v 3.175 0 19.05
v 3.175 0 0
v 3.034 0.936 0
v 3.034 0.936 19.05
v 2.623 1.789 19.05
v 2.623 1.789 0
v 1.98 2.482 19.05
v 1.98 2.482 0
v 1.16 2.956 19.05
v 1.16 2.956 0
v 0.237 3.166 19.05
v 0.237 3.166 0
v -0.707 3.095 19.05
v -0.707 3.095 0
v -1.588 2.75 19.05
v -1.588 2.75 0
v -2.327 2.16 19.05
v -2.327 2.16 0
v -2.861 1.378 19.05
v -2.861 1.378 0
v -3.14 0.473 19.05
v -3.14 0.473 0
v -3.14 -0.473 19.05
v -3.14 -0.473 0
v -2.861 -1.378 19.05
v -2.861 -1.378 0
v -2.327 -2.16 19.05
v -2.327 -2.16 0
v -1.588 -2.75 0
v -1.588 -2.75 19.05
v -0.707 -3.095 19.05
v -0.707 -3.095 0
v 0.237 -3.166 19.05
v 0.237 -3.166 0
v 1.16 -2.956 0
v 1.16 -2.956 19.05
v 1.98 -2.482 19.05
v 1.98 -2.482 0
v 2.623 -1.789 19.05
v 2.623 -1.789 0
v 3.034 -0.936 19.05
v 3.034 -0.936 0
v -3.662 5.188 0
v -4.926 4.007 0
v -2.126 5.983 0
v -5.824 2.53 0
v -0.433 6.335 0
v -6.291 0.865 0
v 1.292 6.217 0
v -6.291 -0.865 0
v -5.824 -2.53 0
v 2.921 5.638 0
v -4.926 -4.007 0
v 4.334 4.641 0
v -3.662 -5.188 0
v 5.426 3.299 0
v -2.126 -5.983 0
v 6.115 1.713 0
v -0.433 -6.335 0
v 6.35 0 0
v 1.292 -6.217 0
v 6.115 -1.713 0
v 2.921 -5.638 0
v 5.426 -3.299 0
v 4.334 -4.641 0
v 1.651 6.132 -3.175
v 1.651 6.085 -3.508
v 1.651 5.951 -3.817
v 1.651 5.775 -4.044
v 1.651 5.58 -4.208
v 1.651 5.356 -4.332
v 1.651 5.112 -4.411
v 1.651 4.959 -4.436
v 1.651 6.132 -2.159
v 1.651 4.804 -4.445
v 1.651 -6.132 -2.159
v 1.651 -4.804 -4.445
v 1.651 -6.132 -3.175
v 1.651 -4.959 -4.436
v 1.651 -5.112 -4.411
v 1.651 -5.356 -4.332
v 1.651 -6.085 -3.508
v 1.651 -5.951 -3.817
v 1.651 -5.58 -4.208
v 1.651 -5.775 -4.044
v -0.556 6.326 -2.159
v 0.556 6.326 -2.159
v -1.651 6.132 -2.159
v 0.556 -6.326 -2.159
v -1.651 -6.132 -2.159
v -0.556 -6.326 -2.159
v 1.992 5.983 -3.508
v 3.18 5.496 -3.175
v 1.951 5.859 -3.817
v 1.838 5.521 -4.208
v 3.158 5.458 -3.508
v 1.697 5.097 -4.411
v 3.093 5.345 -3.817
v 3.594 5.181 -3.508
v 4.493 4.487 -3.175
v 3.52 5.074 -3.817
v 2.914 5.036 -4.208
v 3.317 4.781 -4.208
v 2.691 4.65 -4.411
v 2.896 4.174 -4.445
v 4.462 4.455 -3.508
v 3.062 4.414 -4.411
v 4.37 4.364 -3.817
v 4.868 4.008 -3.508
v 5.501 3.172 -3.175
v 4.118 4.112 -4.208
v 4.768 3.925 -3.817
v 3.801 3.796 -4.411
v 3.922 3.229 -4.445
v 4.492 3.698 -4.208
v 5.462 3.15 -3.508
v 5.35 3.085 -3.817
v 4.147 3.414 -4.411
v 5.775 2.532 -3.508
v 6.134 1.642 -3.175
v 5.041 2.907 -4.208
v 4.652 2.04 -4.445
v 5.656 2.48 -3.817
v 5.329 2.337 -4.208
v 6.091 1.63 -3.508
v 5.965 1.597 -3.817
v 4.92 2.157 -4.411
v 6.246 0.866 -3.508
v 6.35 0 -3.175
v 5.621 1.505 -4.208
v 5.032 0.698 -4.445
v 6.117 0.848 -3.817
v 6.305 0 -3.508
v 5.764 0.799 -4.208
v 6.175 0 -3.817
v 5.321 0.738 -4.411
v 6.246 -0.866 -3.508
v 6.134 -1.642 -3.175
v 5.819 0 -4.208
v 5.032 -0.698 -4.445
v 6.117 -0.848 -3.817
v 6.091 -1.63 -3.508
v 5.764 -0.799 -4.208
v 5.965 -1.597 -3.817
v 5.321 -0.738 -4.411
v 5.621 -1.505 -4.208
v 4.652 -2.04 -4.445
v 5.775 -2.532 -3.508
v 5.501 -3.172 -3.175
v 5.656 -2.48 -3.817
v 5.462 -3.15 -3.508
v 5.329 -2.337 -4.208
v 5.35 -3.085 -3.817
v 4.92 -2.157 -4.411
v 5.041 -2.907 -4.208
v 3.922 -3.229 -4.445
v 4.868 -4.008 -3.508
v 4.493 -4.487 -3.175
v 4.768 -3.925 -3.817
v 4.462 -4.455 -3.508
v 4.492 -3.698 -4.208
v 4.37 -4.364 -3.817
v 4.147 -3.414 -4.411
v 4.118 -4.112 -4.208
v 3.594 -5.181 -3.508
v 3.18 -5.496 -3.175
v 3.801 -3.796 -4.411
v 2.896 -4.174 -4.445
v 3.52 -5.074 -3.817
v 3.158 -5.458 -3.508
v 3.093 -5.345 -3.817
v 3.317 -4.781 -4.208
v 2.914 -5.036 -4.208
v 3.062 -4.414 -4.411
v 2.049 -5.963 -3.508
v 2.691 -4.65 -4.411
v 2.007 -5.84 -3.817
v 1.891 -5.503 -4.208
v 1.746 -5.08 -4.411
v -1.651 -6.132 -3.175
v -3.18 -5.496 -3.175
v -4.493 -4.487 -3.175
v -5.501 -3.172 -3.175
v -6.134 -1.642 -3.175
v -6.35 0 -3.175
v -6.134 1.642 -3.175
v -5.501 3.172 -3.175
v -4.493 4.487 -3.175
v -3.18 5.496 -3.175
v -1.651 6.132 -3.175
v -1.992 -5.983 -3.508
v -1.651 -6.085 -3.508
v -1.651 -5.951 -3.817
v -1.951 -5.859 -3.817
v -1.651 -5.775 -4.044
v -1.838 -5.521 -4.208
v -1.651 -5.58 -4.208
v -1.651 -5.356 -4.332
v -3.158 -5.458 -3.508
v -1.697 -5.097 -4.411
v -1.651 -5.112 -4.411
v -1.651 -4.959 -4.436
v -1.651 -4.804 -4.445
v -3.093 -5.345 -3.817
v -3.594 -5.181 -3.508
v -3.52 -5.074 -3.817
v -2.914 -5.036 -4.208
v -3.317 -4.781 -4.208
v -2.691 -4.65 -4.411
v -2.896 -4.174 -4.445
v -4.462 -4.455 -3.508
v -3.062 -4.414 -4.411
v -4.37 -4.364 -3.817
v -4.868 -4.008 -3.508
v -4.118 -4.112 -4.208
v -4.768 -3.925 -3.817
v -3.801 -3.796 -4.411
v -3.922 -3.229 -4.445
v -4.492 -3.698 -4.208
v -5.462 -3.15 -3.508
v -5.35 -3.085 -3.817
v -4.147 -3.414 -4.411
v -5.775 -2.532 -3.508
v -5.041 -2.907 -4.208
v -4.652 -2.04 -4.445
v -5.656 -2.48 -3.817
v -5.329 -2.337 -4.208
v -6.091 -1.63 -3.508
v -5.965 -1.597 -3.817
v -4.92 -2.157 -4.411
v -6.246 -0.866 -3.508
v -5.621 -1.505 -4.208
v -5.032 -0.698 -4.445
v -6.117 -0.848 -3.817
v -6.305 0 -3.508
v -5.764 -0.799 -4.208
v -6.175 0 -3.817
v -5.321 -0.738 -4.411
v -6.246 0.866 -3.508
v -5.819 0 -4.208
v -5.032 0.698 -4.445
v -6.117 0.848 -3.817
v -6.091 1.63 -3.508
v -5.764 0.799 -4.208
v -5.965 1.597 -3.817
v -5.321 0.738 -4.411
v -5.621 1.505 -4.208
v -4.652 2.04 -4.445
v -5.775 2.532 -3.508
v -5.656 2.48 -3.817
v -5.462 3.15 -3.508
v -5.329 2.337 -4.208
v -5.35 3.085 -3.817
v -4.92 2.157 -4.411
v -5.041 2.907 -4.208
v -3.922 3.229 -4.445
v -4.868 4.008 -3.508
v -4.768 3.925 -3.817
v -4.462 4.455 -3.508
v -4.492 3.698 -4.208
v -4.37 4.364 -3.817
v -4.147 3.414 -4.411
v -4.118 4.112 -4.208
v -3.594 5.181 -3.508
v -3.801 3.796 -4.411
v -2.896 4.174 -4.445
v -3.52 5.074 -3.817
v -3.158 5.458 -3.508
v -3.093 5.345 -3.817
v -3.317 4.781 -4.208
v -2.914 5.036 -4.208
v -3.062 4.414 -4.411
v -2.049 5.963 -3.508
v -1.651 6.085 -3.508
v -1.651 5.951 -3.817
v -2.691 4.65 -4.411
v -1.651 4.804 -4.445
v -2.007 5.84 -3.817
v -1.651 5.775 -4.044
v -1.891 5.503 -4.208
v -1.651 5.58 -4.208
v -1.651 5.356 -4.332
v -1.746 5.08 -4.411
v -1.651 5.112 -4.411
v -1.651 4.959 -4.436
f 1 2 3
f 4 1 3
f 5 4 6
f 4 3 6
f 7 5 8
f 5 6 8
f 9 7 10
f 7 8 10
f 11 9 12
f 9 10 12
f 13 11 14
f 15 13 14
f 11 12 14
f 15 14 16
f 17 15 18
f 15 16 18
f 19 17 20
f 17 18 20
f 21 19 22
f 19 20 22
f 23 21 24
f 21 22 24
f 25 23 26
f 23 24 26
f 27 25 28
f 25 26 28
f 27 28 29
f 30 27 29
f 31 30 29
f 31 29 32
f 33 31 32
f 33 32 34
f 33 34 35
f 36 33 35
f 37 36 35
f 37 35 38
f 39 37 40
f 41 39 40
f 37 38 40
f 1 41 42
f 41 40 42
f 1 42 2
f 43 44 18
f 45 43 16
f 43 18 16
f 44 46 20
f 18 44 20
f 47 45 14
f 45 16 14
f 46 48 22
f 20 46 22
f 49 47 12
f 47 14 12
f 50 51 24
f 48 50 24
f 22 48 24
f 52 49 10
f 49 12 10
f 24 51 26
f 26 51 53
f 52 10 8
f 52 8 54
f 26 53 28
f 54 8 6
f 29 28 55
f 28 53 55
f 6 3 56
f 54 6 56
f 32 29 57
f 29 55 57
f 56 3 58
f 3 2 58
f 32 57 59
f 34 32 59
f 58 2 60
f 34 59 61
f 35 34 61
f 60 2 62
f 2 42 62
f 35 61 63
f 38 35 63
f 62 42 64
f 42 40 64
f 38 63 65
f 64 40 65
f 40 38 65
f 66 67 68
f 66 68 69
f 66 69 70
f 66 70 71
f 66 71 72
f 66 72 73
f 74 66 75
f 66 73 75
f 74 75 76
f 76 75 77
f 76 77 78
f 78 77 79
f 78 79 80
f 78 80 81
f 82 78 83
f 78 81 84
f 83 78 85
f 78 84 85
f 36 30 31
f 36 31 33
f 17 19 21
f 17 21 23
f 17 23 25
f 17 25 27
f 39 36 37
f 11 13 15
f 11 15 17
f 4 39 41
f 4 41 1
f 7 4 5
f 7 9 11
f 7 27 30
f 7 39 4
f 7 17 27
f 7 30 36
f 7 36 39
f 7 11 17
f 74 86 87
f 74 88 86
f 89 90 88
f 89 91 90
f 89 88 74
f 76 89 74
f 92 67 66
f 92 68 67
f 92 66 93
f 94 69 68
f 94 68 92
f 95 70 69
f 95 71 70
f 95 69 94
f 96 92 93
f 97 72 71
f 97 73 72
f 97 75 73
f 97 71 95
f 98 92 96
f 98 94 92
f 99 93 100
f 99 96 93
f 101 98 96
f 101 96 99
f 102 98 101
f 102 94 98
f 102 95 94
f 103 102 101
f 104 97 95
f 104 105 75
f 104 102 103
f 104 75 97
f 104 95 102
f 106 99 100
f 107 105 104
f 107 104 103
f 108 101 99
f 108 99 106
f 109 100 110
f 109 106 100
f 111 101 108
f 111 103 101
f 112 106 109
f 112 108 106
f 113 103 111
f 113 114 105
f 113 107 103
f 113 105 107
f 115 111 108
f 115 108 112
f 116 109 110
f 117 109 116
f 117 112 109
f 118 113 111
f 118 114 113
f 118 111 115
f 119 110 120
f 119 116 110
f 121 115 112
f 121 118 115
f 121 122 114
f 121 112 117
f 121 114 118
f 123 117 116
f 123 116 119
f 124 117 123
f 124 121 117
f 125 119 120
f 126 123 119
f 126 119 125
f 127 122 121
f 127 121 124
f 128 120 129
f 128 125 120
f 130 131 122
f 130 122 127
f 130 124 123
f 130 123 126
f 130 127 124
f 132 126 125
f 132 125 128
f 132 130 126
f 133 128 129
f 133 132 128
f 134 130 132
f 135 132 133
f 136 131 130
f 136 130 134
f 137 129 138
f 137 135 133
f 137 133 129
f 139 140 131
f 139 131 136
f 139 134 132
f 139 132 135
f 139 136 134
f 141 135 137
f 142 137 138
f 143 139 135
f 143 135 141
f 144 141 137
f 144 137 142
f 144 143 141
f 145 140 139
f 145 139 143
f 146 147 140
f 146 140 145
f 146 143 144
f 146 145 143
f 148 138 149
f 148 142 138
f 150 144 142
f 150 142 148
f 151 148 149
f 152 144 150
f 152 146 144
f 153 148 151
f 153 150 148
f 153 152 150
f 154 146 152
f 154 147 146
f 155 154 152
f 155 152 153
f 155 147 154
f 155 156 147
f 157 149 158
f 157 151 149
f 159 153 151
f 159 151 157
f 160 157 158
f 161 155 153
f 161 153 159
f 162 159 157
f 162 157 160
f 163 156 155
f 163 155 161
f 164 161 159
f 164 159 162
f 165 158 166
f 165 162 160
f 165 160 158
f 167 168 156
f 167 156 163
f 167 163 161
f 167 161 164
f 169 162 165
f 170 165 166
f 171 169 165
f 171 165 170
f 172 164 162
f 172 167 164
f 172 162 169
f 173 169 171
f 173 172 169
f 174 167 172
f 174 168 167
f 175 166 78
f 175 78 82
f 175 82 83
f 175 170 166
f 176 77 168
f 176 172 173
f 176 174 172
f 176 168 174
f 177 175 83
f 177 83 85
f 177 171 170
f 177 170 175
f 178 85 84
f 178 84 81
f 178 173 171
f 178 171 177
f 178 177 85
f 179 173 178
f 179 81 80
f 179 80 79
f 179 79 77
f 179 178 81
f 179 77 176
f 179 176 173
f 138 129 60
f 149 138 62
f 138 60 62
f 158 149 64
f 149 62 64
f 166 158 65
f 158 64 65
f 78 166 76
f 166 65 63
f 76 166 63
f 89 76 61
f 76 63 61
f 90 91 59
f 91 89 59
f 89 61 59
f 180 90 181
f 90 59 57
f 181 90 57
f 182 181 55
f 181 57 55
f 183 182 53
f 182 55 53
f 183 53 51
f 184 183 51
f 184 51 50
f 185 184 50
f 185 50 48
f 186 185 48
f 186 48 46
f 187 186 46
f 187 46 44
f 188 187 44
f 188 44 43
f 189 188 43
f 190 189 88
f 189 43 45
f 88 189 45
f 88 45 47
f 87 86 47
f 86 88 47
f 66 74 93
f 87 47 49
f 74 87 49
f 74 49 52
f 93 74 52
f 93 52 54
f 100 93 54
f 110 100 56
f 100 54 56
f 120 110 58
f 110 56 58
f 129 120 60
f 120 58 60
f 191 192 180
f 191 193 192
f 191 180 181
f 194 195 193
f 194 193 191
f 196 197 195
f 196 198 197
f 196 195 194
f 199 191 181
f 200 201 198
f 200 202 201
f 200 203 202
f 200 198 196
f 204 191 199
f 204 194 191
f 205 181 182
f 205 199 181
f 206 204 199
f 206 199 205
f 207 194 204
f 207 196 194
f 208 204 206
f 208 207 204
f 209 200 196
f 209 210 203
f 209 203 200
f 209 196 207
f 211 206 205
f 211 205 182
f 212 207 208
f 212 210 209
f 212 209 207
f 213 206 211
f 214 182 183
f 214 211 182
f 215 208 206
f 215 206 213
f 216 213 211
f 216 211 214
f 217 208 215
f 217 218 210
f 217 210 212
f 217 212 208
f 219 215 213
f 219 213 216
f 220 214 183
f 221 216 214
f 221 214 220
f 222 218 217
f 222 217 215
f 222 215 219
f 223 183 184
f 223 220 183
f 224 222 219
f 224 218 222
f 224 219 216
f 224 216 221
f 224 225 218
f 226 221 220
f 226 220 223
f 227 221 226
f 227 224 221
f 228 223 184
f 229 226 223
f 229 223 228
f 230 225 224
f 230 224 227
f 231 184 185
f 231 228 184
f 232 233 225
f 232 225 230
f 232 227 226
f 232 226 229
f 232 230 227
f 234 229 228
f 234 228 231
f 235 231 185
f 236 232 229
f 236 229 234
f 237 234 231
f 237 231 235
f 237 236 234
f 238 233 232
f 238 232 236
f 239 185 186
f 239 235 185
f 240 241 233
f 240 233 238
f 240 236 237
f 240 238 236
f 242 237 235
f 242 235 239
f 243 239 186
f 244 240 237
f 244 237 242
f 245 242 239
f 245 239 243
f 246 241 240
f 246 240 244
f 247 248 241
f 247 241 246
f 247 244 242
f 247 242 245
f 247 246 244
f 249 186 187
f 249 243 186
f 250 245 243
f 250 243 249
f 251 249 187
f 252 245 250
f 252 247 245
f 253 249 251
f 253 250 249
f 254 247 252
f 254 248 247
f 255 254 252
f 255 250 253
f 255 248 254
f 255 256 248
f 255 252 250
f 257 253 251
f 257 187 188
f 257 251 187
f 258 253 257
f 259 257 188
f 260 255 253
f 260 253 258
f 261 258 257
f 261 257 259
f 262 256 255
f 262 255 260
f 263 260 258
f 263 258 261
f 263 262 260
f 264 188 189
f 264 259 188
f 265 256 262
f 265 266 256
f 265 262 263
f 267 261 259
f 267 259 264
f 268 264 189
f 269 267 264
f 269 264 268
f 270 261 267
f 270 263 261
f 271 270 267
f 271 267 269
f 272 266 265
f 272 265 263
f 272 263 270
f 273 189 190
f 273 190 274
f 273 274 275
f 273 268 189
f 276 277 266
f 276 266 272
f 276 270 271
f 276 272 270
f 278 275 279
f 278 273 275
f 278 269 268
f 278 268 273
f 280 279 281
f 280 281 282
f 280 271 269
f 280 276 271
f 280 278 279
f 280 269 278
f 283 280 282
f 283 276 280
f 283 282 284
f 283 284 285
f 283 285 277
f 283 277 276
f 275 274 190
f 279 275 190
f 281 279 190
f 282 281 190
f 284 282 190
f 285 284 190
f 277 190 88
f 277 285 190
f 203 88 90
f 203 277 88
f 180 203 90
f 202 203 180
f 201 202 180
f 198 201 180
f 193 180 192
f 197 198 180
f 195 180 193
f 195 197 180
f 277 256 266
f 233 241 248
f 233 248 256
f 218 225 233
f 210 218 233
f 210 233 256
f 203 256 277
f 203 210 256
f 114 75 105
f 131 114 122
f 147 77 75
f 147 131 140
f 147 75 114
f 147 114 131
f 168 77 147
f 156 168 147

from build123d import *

# Parameters (mm, degrees)
F0_R     = 3.175
F1_DEPTH = 19.05
F2_R     = 6.35
F3_DEPTH = 4.445
F4_W     = 3.302
F4_H     = 26.5450086477
F5_DEPTH = 2.286
F6_R     = 1.27


with BuildPart() as f1:
    # F0 (on Top) → F1 (new body)
    with BuildSketch(Plane.XY):
        Circle(F0_R)
    extrude(amount=F1_DEPTH)

    # F2 (on face) → F3 (join)
    with BuildSketch(Plane(origin=(0, 0, 0), x_dir=(1, 0, 0), z_dir=(0, 0, -1))):
        Circle(F2_R)
    extrude(amount=F3_DEPTH)

    # F4 (on face) → F5 (cut)
    with BuildSketch(Plane(origin=(0, 0, -4.445), x_dir=(1, 0, 0), z_dir=(0, 0, -1))):
        Rectangle(F4_W, F4_H)
    extrude(amount=-F5_DEPTH, mode=Mode.SUBTRACT)

    # F6
    f6_edges = [f1.edges().sort_by_distance(p)[0] for p in [
        (-6.35, 0, -4.445),
        (5.040156, 3.862554, -4.445),
        (5.040156, -3.862554, -4.445),
    ]]
    fillet(f6_edges, radius=F6_R)


solid = f1.part
